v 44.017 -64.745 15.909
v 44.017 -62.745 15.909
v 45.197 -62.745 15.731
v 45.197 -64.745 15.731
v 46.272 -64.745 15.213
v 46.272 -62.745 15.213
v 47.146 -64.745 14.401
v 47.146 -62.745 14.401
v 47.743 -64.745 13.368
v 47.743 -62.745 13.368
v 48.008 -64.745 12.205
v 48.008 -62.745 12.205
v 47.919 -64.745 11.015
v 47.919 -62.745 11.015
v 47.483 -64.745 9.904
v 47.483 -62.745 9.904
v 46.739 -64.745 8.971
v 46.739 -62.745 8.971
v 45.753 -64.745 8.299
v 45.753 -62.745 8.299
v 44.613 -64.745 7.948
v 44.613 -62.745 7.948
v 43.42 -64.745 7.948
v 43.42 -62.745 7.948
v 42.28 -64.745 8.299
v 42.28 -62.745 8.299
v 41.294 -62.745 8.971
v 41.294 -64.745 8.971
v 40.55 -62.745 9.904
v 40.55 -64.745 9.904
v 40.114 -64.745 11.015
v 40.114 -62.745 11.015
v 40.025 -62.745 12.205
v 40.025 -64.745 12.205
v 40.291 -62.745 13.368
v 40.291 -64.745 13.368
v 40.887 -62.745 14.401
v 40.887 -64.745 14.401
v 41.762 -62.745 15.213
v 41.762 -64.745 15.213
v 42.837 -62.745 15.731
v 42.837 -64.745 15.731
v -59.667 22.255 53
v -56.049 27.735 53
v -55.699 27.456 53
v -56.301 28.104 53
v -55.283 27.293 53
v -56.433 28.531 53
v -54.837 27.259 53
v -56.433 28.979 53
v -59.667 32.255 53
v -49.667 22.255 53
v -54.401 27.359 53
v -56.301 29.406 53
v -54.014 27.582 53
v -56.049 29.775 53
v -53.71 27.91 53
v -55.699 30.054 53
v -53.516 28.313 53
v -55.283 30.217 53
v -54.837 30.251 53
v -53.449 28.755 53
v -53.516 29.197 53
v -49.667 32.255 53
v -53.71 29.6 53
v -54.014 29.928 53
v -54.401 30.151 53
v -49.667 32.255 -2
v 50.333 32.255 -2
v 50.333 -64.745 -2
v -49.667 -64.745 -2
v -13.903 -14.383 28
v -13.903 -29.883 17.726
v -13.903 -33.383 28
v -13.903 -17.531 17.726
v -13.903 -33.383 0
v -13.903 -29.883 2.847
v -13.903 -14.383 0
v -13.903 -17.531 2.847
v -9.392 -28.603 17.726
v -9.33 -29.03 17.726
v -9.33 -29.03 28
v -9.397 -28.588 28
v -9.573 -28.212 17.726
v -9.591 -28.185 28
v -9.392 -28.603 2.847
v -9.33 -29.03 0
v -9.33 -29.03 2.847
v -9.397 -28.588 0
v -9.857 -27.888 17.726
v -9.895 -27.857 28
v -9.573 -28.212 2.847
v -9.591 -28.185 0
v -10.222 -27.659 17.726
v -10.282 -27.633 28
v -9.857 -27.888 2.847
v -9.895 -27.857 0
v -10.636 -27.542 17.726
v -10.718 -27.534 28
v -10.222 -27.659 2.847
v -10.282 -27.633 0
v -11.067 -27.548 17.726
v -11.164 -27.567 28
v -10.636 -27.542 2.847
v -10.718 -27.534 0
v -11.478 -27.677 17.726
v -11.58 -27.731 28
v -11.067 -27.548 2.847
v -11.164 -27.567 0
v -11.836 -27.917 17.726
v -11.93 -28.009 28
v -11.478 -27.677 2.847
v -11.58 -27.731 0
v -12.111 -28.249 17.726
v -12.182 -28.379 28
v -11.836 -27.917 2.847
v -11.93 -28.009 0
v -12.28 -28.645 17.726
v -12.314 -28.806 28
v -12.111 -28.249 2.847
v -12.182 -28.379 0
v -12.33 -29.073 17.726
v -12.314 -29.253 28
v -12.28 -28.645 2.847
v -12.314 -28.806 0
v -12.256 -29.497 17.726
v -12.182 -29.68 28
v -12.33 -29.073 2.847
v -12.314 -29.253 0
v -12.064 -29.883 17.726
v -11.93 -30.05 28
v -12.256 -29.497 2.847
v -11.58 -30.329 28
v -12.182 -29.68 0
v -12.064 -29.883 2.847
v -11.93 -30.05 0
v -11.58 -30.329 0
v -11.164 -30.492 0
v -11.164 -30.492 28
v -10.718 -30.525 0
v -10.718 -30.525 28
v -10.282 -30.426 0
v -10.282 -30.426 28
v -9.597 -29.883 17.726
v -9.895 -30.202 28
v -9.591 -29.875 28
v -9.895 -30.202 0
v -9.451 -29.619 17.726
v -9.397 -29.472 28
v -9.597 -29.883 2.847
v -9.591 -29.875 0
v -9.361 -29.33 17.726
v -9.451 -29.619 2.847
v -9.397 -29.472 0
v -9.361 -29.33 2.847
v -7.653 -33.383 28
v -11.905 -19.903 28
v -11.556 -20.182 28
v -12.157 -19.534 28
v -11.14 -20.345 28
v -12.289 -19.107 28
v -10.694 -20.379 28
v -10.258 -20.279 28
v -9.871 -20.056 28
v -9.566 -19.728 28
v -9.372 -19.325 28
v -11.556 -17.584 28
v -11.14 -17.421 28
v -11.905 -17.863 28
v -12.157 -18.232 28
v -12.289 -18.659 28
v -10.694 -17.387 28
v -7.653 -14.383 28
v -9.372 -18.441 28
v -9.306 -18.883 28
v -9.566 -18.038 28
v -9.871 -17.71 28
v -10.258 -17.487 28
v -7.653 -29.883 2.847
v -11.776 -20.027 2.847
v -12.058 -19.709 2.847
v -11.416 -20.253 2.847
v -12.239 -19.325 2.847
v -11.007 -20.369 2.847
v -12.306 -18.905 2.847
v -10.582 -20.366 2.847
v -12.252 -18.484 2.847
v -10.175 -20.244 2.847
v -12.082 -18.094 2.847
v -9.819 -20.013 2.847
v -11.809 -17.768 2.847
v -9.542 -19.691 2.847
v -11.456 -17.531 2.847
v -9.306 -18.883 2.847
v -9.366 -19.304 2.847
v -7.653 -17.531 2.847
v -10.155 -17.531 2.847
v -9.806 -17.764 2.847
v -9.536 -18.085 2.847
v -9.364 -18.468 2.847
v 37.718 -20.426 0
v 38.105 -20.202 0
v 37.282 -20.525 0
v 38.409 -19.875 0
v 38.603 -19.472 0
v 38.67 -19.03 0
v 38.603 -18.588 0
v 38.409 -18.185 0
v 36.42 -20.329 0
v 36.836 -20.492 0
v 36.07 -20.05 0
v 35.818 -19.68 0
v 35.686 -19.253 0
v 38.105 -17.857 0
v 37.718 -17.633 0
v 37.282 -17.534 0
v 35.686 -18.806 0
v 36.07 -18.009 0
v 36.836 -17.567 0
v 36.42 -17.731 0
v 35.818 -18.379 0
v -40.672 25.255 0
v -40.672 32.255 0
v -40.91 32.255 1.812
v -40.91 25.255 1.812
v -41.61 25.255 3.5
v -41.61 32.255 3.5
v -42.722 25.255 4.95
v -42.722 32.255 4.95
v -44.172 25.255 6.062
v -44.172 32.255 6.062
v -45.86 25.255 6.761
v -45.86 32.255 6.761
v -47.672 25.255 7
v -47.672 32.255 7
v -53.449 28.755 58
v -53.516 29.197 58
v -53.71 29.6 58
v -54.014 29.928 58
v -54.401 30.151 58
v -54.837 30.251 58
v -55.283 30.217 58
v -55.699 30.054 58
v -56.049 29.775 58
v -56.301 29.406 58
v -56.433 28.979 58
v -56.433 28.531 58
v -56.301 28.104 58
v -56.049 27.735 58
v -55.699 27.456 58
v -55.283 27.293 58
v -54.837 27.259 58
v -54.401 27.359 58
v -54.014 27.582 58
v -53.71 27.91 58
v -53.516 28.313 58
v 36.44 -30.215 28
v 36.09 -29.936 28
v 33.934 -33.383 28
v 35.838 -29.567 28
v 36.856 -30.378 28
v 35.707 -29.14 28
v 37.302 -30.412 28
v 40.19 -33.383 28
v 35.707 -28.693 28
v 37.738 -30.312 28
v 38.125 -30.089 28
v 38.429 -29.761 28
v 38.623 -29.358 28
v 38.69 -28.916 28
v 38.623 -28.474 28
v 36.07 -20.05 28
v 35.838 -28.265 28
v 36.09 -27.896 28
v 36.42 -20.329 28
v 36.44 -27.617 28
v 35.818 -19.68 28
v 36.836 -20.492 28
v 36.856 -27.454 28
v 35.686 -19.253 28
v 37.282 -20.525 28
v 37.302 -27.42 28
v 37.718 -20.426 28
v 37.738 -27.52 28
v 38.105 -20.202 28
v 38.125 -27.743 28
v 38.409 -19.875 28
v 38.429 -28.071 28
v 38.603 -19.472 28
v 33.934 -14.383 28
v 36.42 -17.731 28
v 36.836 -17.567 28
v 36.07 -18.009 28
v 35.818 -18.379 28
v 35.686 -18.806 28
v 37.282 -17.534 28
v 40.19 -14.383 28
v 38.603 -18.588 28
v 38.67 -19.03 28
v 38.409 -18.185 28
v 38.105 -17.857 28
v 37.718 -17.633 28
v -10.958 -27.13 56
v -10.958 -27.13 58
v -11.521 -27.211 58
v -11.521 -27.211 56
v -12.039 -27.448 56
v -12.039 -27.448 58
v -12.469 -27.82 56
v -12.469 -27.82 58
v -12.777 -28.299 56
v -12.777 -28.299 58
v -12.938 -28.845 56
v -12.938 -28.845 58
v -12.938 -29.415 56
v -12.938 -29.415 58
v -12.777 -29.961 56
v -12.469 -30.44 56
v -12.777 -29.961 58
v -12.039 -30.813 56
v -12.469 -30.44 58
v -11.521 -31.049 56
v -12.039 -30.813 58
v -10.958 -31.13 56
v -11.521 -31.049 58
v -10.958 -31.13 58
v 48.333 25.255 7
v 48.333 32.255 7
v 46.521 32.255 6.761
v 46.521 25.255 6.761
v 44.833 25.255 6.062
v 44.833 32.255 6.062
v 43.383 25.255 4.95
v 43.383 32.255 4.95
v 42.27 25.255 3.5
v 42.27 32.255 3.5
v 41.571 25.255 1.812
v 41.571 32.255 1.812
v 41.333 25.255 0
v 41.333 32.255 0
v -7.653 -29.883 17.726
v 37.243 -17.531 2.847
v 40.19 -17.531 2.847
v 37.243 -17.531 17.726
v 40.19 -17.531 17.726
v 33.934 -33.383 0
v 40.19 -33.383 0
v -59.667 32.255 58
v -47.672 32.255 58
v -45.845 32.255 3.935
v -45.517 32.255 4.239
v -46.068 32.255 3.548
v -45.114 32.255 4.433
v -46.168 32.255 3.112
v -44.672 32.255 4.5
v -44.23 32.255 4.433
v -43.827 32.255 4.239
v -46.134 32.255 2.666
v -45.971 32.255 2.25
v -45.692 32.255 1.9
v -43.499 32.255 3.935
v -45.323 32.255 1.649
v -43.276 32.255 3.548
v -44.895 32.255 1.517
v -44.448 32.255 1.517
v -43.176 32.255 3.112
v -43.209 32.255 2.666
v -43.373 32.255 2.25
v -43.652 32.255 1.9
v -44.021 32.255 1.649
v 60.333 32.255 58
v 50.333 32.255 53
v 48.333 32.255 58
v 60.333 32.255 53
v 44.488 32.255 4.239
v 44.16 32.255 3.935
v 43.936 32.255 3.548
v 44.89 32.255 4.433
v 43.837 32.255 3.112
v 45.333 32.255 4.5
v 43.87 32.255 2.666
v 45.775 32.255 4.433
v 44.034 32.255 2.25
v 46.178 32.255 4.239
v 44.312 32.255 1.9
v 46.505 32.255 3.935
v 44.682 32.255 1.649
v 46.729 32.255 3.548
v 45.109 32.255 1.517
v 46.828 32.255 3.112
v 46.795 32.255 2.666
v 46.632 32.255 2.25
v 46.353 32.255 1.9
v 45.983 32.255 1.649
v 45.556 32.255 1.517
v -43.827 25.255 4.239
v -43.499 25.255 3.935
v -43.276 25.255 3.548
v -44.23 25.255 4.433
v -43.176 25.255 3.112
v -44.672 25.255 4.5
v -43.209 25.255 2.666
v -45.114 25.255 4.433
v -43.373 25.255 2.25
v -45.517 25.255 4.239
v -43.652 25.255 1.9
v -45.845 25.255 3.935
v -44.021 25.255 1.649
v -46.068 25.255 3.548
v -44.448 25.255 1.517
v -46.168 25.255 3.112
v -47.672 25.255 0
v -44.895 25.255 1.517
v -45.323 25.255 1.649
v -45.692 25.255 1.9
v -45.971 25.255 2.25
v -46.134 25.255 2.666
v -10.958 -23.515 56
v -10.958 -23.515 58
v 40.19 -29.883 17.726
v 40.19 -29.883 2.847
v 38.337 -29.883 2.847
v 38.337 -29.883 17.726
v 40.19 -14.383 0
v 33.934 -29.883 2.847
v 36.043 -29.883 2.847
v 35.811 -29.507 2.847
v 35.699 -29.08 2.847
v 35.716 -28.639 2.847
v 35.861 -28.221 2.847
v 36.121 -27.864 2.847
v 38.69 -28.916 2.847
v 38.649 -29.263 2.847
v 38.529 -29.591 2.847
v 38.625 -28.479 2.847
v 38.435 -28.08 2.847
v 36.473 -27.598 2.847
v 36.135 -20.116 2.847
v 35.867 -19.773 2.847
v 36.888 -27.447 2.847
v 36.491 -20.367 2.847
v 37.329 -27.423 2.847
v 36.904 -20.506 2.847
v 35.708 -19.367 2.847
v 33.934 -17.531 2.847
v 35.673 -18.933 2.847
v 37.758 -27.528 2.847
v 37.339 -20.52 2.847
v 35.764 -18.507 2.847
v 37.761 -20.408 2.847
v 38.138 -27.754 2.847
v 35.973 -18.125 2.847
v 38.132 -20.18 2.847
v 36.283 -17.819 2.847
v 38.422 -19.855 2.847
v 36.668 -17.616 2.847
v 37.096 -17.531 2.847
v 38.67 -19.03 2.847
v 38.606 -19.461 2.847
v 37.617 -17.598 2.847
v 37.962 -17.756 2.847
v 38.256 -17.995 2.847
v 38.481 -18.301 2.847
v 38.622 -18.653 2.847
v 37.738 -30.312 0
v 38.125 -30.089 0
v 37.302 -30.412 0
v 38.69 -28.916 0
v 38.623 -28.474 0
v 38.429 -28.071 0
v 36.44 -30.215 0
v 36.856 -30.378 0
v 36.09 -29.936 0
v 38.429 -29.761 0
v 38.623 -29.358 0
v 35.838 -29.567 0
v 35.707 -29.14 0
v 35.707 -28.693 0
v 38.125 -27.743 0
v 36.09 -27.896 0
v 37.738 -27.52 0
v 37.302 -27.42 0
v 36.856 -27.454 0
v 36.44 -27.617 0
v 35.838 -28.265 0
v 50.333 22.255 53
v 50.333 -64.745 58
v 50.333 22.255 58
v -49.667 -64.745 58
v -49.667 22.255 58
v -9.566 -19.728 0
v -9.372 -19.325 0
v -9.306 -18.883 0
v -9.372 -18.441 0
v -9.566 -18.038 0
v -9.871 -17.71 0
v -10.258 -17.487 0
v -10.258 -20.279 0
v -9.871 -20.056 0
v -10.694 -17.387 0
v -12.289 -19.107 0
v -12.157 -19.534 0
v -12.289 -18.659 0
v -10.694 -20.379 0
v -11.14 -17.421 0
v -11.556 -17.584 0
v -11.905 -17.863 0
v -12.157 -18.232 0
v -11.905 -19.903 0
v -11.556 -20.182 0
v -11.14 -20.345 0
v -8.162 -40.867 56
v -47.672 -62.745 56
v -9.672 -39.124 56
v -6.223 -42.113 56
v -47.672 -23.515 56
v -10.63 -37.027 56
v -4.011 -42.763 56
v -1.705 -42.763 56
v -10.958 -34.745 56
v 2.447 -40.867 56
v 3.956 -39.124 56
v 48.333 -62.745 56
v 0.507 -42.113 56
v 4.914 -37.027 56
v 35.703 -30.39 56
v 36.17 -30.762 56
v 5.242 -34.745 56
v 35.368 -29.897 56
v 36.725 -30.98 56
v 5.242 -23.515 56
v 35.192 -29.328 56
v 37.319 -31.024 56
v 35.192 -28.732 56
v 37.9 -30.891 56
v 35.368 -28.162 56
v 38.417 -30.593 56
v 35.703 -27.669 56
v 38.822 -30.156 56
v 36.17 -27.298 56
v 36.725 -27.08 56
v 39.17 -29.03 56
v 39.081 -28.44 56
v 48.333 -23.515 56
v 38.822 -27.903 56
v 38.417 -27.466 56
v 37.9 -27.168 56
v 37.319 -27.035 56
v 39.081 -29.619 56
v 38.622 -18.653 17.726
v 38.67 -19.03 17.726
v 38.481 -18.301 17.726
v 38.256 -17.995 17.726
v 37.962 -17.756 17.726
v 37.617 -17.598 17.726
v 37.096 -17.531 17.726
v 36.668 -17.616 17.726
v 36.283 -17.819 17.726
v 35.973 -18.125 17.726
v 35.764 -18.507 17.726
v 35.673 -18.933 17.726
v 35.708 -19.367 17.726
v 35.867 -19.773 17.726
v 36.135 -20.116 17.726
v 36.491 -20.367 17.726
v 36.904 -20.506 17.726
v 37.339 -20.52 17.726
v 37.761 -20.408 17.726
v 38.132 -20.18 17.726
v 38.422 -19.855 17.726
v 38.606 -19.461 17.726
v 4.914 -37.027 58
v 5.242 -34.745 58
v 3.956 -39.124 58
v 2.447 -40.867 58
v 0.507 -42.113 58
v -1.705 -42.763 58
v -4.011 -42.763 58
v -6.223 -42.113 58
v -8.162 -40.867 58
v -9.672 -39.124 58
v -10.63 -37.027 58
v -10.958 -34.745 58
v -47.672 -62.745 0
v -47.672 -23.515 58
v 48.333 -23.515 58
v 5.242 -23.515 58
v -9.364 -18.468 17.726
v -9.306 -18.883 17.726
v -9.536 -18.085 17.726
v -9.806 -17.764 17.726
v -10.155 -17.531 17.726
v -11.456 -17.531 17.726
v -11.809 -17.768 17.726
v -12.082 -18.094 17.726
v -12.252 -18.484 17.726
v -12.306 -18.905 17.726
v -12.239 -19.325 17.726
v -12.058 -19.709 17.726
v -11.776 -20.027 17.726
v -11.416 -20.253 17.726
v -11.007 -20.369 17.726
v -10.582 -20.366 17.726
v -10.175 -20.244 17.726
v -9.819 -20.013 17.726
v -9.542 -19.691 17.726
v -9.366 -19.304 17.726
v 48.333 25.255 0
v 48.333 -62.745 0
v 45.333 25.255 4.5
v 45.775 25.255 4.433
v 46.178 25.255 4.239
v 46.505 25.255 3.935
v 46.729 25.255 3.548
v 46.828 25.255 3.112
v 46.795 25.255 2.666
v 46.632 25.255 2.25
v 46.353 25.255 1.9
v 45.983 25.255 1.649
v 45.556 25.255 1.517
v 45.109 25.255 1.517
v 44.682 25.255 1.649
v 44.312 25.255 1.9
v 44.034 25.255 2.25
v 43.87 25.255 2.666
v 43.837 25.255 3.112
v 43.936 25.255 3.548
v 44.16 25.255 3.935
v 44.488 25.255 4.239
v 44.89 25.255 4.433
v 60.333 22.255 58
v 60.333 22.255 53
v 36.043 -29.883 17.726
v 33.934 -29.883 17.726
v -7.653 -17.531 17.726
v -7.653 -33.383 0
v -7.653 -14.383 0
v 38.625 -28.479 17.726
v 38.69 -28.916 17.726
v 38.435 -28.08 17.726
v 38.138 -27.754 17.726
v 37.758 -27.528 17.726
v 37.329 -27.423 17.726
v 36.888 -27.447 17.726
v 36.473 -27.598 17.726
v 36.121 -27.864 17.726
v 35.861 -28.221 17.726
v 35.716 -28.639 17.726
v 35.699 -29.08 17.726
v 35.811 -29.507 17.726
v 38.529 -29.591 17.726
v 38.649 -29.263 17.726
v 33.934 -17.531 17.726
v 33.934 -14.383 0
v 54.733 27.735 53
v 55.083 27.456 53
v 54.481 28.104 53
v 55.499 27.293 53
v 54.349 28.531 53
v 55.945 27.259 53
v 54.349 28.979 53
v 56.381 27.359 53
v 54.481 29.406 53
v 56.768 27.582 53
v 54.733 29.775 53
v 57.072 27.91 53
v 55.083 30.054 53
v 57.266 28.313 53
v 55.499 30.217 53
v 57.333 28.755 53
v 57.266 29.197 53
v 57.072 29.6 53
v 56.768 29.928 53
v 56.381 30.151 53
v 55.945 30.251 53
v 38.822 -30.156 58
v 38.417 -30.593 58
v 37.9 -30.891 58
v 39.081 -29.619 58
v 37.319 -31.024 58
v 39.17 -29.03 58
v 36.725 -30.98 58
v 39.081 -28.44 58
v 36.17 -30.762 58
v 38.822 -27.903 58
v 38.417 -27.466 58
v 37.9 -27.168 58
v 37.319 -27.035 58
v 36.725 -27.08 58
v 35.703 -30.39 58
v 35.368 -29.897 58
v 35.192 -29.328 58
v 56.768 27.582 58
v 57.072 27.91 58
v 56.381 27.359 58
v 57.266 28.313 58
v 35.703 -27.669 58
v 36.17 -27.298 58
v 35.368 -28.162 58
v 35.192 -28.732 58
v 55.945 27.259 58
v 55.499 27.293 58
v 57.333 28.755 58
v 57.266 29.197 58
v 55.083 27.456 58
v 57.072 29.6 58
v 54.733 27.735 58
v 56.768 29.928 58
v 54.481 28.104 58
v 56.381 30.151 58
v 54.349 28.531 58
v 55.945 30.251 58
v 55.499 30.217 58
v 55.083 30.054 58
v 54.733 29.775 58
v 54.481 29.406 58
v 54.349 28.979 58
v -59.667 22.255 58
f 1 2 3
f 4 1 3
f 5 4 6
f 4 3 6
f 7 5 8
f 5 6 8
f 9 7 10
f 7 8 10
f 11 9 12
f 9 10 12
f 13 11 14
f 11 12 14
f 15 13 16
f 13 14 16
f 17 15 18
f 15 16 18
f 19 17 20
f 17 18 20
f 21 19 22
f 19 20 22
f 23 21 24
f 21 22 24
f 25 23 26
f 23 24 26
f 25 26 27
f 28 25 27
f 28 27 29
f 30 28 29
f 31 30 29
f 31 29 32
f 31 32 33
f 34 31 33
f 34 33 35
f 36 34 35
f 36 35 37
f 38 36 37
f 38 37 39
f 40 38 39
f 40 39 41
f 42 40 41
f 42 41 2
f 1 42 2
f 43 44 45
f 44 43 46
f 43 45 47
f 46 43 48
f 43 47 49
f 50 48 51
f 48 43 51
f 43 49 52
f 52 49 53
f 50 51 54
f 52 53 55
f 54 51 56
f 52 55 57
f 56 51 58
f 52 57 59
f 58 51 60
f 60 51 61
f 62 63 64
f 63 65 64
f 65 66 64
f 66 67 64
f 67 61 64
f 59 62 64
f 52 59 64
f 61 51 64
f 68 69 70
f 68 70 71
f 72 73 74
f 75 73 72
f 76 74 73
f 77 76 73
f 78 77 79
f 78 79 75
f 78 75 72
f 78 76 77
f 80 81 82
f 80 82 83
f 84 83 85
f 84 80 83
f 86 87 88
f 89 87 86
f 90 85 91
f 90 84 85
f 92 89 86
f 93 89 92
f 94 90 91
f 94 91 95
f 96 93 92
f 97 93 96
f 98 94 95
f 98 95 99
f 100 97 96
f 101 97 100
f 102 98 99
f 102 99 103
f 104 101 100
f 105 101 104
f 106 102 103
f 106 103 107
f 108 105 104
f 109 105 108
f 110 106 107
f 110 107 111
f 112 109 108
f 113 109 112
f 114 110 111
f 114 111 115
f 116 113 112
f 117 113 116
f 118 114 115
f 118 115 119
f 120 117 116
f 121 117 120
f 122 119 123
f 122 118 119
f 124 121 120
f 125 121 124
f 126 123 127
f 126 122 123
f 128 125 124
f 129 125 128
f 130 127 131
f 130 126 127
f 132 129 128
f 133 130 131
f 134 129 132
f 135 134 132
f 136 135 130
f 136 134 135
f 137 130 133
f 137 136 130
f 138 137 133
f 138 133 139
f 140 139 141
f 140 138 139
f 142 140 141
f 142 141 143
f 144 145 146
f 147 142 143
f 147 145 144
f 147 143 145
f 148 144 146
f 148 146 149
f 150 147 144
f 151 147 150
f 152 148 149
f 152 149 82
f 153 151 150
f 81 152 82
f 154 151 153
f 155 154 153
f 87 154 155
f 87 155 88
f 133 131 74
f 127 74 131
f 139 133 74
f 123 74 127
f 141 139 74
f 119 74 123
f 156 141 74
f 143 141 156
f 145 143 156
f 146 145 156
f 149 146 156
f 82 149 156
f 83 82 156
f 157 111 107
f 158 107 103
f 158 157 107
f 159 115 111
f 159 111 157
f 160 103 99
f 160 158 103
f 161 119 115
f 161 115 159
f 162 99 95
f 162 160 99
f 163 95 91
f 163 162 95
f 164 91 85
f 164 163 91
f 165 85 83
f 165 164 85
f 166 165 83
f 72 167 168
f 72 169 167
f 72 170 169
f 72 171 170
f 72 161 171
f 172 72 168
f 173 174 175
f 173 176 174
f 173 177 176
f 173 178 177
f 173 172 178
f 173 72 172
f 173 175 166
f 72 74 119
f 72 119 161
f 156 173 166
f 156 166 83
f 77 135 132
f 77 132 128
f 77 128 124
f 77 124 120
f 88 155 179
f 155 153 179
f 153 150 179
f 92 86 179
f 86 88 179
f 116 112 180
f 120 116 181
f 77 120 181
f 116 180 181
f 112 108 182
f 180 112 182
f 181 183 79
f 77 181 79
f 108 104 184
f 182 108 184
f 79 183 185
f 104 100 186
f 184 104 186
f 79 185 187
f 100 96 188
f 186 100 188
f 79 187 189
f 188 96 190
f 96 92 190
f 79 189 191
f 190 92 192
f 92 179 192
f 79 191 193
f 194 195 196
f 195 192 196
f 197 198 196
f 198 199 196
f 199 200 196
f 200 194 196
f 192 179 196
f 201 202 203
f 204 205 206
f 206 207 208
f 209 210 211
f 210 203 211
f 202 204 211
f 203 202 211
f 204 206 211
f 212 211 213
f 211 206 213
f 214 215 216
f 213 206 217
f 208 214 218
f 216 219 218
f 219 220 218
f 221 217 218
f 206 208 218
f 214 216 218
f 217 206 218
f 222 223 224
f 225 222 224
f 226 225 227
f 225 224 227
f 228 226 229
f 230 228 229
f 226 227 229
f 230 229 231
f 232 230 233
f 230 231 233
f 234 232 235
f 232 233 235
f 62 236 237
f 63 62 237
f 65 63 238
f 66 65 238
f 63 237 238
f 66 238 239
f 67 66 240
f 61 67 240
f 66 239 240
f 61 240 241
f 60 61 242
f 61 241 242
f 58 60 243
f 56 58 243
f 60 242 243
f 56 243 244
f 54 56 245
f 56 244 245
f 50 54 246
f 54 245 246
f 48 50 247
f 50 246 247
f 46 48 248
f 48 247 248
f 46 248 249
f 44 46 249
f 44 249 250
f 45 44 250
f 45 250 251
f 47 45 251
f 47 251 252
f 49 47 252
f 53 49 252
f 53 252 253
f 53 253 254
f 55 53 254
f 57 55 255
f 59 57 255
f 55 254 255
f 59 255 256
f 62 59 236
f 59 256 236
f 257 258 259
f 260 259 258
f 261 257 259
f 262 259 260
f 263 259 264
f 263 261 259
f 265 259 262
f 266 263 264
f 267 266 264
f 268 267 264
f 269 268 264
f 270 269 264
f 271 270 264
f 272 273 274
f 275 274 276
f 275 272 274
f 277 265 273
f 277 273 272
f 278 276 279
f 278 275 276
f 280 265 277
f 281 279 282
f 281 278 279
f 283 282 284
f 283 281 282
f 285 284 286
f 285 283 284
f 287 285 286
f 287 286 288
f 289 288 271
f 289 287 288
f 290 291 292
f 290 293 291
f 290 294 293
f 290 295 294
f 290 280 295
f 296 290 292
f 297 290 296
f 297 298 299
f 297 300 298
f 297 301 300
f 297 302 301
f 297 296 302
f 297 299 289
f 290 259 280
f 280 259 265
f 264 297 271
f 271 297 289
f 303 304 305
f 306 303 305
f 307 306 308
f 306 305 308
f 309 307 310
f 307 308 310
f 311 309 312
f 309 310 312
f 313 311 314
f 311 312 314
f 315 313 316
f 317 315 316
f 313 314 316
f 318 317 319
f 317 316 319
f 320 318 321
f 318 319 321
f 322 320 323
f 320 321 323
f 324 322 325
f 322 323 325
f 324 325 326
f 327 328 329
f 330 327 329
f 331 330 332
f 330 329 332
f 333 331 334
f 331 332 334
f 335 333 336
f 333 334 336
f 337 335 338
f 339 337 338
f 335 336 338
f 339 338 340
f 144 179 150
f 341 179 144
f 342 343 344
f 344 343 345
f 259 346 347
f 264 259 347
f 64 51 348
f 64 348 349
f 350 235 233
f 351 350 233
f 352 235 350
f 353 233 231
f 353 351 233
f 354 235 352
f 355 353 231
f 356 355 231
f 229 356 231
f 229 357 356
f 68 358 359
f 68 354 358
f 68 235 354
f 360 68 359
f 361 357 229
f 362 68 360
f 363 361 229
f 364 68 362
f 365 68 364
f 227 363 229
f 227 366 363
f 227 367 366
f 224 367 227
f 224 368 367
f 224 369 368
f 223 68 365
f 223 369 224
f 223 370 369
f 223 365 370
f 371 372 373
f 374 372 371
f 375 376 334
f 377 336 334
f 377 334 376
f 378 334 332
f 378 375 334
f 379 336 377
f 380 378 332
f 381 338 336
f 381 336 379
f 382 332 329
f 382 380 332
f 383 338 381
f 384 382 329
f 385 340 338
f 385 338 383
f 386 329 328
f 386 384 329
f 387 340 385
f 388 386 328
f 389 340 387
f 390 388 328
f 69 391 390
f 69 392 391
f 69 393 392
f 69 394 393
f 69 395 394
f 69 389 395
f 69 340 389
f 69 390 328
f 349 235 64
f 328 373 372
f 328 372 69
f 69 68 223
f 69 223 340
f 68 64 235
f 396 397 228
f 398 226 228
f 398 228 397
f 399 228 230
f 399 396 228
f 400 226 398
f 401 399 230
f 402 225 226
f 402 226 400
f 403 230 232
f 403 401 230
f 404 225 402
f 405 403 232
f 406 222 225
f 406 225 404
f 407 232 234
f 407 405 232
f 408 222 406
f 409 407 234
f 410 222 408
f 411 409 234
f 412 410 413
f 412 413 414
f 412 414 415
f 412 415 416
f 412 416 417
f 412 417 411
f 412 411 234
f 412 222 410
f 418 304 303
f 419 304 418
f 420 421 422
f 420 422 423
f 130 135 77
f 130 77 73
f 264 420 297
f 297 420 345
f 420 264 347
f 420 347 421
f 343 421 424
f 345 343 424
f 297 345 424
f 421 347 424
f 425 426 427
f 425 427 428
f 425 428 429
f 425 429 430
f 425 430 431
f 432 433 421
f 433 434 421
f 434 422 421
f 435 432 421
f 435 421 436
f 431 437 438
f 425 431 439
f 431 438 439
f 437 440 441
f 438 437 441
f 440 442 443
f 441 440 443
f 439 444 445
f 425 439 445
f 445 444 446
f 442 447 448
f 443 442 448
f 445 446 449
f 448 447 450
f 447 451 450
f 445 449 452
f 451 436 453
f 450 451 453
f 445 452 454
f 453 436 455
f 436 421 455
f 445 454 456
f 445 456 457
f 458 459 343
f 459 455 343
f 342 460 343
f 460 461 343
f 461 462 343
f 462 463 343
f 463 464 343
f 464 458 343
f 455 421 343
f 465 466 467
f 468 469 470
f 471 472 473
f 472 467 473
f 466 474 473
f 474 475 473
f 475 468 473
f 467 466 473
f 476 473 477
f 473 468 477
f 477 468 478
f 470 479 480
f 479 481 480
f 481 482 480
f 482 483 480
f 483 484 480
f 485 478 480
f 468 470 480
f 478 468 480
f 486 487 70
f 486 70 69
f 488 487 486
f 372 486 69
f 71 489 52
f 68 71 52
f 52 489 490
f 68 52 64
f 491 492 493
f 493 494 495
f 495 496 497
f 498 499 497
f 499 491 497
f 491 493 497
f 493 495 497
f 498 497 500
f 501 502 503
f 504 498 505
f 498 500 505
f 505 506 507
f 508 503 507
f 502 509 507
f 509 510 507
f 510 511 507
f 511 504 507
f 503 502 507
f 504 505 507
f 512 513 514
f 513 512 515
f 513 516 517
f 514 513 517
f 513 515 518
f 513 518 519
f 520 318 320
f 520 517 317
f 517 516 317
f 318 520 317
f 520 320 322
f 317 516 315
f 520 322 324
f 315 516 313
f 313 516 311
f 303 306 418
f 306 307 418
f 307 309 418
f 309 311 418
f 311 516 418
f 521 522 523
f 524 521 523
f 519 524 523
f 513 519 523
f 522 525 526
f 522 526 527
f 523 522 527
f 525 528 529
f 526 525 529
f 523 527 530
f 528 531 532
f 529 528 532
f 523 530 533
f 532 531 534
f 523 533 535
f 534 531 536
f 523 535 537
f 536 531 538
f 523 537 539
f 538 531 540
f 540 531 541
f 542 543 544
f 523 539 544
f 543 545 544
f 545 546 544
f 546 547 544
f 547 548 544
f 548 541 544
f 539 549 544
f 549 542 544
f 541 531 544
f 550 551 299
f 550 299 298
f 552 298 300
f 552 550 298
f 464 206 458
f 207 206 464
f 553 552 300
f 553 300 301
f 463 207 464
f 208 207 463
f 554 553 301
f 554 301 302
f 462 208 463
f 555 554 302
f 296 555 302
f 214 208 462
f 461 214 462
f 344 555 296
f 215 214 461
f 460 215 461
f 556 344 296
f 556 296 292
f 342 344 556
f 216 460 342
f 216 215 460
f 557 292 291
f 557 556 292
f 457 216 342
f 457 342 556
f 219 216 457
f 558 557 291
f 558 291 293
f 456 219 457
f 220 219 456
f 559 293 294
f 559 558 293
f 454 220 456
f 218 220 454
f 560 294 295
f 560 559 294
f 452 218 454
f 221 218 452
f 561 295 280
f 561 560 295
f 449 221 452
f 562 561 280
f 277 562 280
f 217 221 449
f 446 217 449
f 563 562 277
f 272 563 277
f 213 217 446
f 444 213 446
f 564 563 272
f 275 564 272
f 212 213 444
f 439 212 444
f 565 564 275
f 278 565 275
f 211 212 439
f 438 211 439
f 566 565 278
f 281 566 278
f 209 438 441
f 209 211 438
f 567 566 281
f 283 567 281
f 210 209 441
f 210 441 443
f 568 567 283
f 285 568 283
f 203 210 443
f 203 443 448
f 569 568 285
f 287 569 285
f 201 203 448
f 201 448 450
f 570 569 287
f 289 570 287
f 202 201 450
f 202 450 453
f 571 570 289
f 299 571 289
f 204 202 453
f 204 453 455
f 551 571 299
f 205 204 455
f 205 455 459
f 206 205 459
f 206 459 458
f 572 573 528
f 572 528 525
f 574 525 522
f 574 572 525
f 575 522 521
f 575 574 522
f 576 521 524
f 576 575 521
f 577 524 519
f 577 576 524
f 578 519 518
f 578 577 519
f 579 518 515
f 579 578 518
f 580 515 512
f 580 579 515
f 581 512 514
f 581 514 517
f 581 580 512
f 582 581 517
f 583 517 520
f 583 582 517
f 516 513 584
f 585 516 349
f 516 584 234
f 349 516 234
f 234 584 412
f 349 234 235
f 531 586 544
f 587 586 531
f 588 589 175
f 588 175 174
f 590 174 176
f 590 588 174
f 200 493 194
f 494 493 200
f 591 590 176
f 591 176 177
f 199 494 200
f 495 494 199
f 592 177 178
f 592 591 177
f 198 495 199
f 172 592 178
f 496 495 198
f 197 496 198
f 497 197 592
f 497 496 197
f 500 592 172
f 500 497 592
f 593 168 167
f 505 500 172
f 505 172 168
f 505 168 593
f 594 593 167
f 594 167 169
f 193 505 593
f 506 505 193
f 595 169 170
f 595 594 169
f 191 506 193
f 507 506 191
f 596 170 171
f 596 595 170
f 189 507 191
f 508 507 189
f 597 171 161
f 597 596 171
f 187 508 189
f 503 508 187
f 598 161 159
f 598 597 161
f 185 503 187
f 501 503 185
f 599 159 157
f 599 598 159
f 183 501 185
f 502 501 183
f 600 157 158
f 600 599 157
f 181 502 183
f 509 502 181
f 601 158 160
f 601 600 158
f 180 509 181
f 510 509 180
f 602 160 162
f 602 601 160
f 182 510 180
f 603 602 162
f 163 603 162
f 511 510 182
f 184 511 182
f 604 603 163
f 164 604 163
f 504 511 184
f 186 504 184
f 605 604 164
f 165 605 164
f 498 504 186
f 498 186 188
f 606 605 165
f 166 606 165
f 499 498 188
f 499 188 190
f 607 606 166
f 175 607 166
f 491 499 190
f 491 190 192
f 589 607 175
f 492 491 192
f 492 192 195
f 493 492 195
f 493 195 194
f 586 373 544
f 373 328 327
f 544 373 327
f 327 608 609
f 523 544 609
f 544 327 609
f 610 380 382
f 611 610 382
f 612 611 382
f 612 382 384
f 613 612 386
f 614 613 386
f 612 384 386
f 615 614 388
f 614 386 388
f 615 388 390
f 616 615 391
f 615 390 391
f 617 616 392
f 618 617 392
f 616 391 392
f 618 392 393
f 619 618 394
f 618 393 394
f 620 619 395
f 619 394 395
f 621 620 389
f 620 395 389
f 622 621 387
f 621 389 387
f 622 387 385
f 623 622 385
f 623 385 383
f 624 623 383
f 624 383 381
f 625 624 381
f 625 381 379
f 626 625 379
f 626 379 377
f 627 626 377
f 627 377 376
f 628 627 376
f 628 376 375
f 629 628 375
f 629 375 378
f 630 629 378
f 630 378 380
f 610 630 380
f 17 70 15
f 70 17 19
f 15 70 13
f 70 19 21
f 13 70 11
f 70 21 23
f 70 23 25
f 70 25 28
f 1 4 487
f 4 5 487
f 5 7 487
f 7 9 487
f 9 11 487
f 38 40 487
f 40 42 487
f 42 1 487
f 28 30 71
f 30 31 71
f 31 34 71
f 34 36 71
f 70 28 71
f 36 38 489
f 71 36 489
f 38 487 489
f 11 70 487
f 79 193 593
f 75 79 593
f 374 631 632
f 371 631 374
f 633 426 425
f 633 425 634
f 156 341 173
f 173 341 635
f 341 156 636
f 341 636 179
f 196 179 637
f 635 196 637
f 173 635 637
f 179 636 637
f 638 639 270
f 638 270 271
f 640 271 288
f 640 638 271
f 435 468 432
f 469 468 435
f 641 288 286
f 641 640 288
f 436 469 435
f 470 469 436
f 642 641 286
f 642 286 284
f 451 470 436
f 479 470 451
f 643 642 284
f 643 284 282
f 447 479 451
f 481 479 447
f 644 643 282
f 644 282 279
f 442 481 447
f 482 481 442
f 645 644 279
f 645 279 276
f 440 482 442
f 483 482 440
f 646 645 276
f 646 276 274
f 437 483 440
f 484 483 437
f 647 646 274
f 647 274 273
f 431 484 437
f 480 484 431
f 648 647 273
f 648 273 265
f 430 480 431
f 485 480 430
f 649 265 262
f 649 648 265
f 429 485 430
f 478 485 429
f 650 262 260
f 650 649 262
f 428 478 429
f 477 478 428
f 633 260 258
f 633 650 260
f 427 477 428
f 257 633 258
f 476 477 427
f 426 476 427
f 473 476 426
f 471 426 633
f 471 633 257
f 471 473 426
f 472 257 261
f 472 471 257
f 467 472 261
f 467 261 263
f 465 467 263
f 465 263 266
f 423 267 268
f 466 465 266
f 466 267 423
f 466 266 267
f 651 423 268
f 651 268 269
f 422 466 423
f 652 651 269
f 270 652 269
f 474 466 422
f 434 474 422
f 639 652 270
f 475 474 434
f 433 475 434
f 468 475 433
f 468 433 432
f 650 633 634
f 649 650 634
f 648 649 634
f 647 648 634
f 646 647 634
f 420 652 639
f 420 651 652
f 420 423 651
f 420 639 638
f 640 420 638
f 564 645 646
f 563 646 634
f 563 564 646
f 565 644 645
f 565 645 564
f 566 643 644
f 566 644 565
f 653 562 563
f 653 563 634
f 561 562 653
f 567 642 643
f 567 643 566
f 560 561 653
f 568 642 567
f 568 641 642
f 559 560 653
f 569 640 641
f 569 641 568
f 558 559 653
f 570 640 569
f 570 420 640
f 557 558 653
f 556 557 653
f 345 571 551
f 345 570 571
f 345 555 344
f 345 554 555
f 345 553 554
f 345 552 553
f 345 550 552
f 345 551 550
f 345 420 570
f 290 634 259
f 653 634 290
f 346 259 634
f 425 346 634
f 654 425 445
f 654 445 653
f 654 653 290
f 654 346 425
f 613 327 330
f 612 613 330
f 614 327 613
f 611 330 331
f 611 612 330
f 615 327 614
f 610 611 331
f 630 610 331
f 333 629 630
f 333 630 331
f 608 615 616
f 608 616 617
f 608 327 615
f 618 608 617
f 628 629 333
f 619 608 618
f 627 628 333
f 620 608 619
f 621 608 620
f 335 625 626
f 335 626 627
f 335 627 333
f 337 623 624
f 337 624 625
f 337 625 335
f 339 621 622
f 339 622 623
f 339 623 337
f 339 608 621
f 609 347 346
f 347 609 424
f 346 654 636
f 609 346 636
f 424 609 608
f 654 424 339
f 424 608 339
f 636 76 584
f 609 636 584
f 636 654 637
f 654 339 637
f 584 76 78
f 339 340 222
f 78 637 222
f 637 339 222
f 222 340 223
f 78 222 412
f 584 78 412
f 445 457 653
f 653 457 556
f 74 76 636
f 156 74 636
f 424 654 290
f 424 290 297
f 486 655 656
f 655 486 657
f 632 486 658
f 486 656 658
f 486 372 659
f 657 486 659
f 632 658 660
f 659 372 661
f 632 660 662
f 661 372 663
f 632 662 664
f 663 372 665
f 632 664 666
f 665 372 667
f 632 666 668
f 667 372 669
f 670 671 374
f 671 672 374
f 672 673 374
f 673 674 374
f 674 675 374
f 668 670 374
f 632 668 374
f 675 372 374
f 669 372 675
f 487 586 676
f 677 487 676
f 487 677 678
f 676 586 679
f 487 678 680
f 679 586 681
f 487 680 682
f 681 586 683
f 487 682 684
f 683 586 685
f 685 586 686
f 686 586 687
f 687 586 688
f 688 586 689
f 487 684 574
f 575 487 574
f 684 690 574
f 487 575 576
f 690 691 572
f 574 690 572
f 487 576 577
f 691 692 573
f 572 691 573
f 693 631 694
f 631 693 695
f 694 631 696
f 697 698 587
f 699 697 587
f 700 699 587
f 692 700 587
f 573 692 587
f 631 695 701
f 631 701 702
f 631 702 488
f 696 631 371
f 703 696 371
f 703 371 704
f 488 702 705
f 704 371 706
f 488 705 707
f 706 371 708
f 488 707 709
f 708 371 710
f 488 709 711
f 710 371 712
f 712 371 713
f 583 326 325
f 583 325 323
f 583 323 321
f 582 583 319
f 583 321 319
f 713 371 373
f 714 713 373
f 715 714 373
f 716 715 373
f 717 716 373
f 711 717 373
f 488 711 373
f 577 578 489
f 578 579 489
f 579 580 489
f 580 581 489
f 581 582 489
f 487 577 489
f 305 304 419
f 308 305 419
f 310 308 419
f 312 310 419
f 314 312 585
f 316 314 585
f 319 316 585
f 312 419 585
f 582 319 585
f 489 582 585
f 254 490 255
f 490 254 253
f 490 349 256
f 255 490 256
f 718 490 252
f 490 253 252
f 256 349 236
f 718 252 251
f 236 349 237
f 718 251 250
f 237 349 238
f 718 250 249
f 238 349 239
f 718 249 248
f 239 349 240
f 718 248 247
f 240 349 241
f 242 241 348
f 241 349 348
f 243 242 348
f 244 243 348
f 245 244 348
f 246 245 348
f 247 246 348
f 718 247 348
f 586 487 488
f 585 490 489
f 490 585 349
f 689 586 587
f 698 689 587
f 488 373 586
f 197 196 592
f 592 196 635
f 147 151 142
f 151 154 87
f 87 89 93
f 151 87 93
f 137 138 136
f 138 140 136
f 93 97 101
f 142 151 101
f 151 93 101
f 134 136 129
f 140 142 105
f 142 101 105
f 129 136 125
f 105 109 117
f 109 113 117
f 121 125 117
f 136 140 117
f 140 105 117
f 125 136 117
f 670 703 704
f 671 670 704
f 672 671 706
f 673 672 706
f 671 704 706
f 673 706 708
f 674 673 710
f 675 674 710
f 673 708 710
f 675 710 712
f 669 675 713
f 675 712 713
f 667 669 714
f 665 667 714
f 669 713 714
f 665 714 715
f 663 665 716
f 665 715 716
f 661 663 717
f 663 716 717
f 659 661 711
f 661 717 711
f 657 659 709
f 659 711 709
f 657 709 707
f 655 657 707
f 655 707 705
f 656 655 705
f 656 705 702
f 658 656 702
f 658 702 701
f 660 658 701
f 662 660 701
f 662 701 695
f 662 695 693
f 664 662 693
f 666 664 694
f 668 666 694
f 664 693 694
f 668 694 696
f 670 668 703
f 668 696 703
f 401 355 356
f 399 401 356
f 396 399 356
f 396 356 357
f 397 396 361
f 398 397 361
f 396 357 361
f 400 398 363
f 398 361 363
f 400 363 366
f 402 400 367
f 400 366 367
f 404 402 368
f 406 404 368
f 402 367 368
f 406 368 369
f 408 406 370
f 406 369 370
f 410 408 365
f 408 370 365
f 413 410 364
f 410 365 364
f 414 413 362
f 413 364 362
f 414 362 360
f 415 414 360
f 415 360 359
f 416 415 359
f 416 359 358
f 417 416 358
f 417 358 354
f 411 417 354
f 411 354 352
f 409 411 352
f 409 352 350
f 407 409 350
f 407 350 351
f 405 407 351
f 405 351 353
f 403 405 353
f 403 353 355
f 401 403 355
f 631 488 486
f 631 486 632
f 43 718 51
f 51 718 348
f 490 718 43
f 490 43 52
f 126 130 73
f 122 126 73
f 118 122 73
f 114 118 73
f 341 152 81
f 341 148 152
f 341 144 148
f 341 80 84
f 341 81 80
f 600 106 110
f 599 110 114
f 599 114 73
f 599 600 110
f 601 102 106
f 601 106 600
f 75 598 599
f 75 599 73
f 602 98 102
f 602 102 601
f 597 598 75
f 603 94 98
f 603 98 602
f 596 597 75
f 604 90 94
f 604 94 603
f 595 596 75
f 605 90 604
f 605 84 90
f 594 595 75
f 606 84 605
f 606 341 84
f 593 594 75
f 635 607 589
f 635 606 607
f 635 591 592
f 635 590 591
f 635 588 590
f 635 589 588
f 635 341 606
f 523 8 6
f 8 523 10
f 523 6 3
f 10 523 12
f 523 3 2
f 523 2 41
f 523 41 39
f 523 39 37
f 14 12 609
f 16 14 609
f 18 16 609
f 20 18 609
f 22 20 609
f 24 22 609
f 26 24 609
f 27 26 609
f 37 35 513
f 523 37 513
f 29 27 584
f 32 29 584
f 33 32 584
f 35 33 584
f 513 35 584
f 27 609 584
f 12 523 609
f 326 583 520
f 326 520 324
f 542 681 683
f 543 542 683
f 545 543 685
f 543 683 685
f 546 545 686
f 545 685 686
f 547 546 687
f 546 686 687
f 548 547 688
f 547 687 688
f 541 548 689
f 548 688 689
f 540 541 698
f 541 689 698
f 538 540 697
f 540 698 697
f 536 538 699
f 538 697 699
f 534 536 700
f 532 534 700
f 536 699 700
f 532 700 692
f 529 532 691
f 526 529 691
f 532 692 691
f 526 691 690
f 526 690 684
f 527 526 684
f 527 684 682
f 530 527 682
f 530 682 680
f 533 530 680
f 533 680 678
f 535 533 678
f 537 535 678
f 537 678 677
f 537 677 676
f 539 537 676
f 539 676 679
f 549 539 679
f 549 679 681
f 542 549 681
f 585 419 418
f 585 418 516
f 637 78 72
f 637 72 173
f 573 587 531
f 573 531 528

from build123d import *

# Parameters (mm, degrees)
BOSS_EXTRUDE1_DEPTH     = 70
SKETCH2_W               = 100
SKETCH2_H               = 100
BOSS_EXTRUDE2_DEPTH     = 2
SKETCH3_W               = 6.255686465
SKETCH3_H               = 19
SKETCH3_R               = 1.5
SKETCH3_W_2             = 6.249842205
BOSS_EXTRUDE4_DEPTH     = 28
CUT_EXTRUDE2_DEPTH      = 49
CUT_EXTRUDE2_DEPTH_BACK = 10
SKETCH4_W               = 14.879207683
SKETCH4_H               = 12.351519759
SKETCH5_W               = 96.00443459
SKETCH5_H               = 43.693152777
BOSS_EXTRUDE5_DEPTH     = 2
SKETCH9_W               = 100
SKETCH9_H               = 100
CUT_EXTRUDE3_DEPTH      = 42
BOSS_EXTRUDE6_DEPTH     = 2
SKETCH8_R               = 1.5
BOSS_EXTRUDE7_DEPTH     = 10
SKETCH11_W              = 10
SKETCH11_H              = 10
SKETCH11_R              = 1.5
BOSS_EXTRUDE8_DEPTH     = 5
SKETCH13_R              = 2
CUT_EXTRUDE4_DEPTH      = 10
CUT_EXTRUDE5_DEPTH      = 3
SKETCH16_R              = 4.002775558
CUT_EXTRUDE7_DEPTH      = 3


with BuildPart() as part:
    # Sketch1 → Boss-Extrude1 (new body)
    with BuildSketch(Plane.XY):
        Polygon((-47.671840355, 33.254988914), (-47.671840355, 35.254988914), (-49.667405765, 35.254988914), (-49.667405765, -64.745011086), (50.332594235, -64.745011086), (50.332594235, 35.254988914), (48.332594235, 35.254988914), (48.332594235, 33.254988914), (48.332594235, -62.745011086), (-47.671840355, -62.745011086), align=None)
    extrude(amount=BOSS_EXTRUDE1_DEPTH)

    # Sketch2 → Boss-Extrude2 (add)
    with BuildSketch(Plane(origin=(0, 0, 0), x_dir=(-1, 0, 0), z_dir=(0, 0, -1))):
        with Locations((-0.332594235, -14.745011086)):
            Rectangle(SKETCH2_W, SKETCH2_H)
    extrude(amount=BOSS_EXTRUDE2_DEPTH)

    # Sketch3 → Boss-Extrude4 (add)
    # profile 1 of 2: a face of its own
    with BuildSketch(Plane.XY):
        with Locations((37.062045054, -23.882996664)):
            Rectangle(SKETCH3_W, SKETCH3_H)
        with Locations((37.169542955, -19.02966579)):
            Circle(SKETCH3_R, mode=Mode.SUBTRACT)
        with Locations((37.189888286, -28.916071788)):
            Circle(SKETCH3_R, mode=Mode.SUBTRACT)
    # profile 2 of 2: a face of its own
    with BuildSketch(Plane.XY):
        with Locations((-10.777585785, -23.882996664)):
            Rectangle(SKETCH3_W_2, SKETCH3_H)
        with Locations((-10.805764952, -18.882996664)):
            Circle(SKETCH3_R, mode=Mode.SUBTRACT)
        with Locations((-10.830457045, -29.02966579)):
            Circle(SKETCH3_R, mode=Mode.SUBTRACT)
    extrude(amount=BOSS_EXTRUDE4_DEPTH)

    # Sketch4 → Cut-Extrude2 (cut, two sides: drawn at the far end of the back side and taken through both)
    with BuildSketch(Plane.ZY.offset(-33.934201821).offset(-CUT_EXTRUDE2_DEPTH_BACK)):
        with Locations((10.28647213, -23.707236785)):
            Rectangle(SKETCH4_W, SKETCH4_H)
    extrude(amount=CUT_EXTRUDE2_DEPTH + CUT_EXTRUDE2_DEPTH_BACK, mode=Mode.SUBTRACT)

    # Sketch5 → Boss-Extrude5 (add)
    with BuildSketch(Plane.XY.offset(70)):
        with Locations((0.33037694, -40.898434698)):
            Rectangle(SKETCH5_W, SKETCH5_H)
    extrude(amount=-BOSS_EXTRUDE5_DEPTH)

    # Sketch9 → Cut-Extrude3 (cut)
    with BuildSketch(Plane(origin=(0, 0, 58), x_dir=(-1, 0, 0), z_dir=(0, 0, -1))):
        with Locations((-0.332594235, -14.745011086)):
            Rectangle(SKETCH9_W, SKETCH9_H)
    extrude(amount=-CUT_EXTRUDE3_DEPTH, mode=Mode.SUBTRACT)

    # Sketch10 → Boss-Extrude6 (add)
    with BuildSketch(Plane.XY.offset(58)):
        with BuildLine():
            Line((-49.667405765, -64.745011086), (50.332594235, -64.745011086))
            Line((50.332594235, -64.745011086), (50.332594235, -23.515098033))
            Line((50.332594235, -23.515098033), (16.092202794, -23.515098033))
            Line((16.092202794, -23.515098033), (5.242138191, -23.515098033))
            Line((5.242138191, -23.515098033), (5.242138191, -34.745011086))
            ThreePointArc((5.242138191, -34.745011086), (-2.857861809, -42.845011086), (-10.957861809, -34.745011086))
            Line((-10.957861809, -34.745011086), (-10.957861809, -23.515098033))
            Line((-10.957861809, -23.515098033), (-15.769437358, -23.515098033))
            Line((-15.769437358, -23.515098033), (-49.667405765, -23.515098033))
            Line((-49.667405765, -23.515098033), (-49.667405765, -64.745011086))
        make_face()
    extrude(amount=-BOSS_EXTRUDE6_DEPTH)

    # Sketch8 → Boss-Extrude7 (add)
    # profile 1 of 2: a face of its own
    with BuildSketch(Plane(origin=(0, 35.254988914, 0), x_dir=(1, 0, 0), z_dir=(0, 1, 0))):
        with BuildLine():
            Line((-47.671840355, 0), (-40.671840355, 0))
            ThreePointArc((-40.671840355, 0), (-42.722092886, -4.949747468), (-47.671840355, -7))
            Line((-47.671840355, -7), (-47.671840355, 0))
        make_face()
        with Locations(Location((-44.671840355, -3, 0), (0, 0, 270))):
            Circle(SKETCH8_R, mode=Mode.SUBTRACT)
    # profile 2 of 2: a face of its own
    with BuildSketch(Plane(origin=(0, 35.254988914, 0), x_dir=(1, 0, 0), z_dir=(0, 1, 0))):
        with BuildLine():
            Line((48.332594235, 0), (48.332594235, -7))
            ThreePointArc((48.332594235, -7), (43.382846767, -4.949747468), (41.332594235, 0))
            Line((41.332594235, 0), (48.332594235, 0))
        make_face()
        with Locations(Location((45.332594235, -3, 0), (0, 0, 270))):
            Circle(SKETCH8_R, mode=Mode.SUBTRACT)
    extrude(amount=-BOSS_EXTRUDE7_DEPTH)

    # Sketch11 → Boss-Extrude8 (add)
    # profile 1 of 2: a face of its own
    with BuildSketch(Plane.XY.offset(58)):
        with Locations((-54.667405765, 27.254988914)):
            Rectangle(SKETCH11_W, SKETCH11_H)
        with Locations((-54.949444375, 28.754988914)):
            Circle(SKETCH11_R, mode=Mode.SUBTRACT)
    # profile 2 of 2: a face of its own
    with BuildSketch(Plane.XY.offset(58)):
        with Locations((55.332594235, 27.254988914)):
            Rectangle(SKETCH11_W, SKETCH11_H)
        with Locations((55.832594235, 28.754988914)):
            Circle(SKETCH11_R, mode=Mode.SUBTRACT)
    extrude(amount=-BOSS_EXTRUDE8_DEPTH)

    # Sketch13 → Cut-Extrude4 (cut)
    with BuildSketch(Plane.XY.offset(58)):
        with Locations((-10.957861809, -29.13005456)):
            Circle(SKETCH13_R)
        with Locations((37.169542955, -29.02966579)):
            Circle(SKETCH13_R)
    extrude(amount=-CUT_EXTRUDE4_DEPTH, mode=Mode.SUBTRACT)

    # Sketch15 → Cut-Extrude5 (cut)
    with BuildSketch(Plane(origin=(0, 35.254988914, 0), x_dir=(1, 0, 0), z_dir=(0, 1, 0))):
        with BuildLine():
            Line((-47.671840355, -58), (-47.671840355, -7))
            ThreePointArc((-47.671840355, -7), (-42.722092886, -4.949747468), (-40.671840355, 0))
            Line((-40.671840355, 0), (41.332594235, 0))
            ThreePointArc((41.332594235, 0), (43.382846767, -4.949747468), (48.332594235, -7))
            Line((48.332594235, -7), (48.332594235, -58))
            Line((48.332594235, -58), (50.332594235, -58))
            Line((50.332594235, -58), (50.332594235, 2))
            Line((50.332594235, 2), (-49.667405765, 2))
            Line((-49.667405765, 2), (-49.667405765, -58))
            Line((-49.667405765, -58), (-47.671840355, -58))
        make_face()
    extrude(amount=-CUT_EXTRUDE5_DEPTH, mode=Mode.SUBTRACT)

    # Sketch16 → Cut-Extrude7 (cut)
    with BuildSketch(Plane(origin=(0, -62.745011086, 0), x_dir=(1, 0, 0), z_dir=(0, 1, 0))):
        with Locations(Location((44.016753305, -11.905726119, 0), (0, 0, 270))):
            Circle(SKETCH16_R)
    extrude(amount=-CUT_EXTRUDE7_DEPTH, mode=Mode.SUBTRACT)


solid = part.part
